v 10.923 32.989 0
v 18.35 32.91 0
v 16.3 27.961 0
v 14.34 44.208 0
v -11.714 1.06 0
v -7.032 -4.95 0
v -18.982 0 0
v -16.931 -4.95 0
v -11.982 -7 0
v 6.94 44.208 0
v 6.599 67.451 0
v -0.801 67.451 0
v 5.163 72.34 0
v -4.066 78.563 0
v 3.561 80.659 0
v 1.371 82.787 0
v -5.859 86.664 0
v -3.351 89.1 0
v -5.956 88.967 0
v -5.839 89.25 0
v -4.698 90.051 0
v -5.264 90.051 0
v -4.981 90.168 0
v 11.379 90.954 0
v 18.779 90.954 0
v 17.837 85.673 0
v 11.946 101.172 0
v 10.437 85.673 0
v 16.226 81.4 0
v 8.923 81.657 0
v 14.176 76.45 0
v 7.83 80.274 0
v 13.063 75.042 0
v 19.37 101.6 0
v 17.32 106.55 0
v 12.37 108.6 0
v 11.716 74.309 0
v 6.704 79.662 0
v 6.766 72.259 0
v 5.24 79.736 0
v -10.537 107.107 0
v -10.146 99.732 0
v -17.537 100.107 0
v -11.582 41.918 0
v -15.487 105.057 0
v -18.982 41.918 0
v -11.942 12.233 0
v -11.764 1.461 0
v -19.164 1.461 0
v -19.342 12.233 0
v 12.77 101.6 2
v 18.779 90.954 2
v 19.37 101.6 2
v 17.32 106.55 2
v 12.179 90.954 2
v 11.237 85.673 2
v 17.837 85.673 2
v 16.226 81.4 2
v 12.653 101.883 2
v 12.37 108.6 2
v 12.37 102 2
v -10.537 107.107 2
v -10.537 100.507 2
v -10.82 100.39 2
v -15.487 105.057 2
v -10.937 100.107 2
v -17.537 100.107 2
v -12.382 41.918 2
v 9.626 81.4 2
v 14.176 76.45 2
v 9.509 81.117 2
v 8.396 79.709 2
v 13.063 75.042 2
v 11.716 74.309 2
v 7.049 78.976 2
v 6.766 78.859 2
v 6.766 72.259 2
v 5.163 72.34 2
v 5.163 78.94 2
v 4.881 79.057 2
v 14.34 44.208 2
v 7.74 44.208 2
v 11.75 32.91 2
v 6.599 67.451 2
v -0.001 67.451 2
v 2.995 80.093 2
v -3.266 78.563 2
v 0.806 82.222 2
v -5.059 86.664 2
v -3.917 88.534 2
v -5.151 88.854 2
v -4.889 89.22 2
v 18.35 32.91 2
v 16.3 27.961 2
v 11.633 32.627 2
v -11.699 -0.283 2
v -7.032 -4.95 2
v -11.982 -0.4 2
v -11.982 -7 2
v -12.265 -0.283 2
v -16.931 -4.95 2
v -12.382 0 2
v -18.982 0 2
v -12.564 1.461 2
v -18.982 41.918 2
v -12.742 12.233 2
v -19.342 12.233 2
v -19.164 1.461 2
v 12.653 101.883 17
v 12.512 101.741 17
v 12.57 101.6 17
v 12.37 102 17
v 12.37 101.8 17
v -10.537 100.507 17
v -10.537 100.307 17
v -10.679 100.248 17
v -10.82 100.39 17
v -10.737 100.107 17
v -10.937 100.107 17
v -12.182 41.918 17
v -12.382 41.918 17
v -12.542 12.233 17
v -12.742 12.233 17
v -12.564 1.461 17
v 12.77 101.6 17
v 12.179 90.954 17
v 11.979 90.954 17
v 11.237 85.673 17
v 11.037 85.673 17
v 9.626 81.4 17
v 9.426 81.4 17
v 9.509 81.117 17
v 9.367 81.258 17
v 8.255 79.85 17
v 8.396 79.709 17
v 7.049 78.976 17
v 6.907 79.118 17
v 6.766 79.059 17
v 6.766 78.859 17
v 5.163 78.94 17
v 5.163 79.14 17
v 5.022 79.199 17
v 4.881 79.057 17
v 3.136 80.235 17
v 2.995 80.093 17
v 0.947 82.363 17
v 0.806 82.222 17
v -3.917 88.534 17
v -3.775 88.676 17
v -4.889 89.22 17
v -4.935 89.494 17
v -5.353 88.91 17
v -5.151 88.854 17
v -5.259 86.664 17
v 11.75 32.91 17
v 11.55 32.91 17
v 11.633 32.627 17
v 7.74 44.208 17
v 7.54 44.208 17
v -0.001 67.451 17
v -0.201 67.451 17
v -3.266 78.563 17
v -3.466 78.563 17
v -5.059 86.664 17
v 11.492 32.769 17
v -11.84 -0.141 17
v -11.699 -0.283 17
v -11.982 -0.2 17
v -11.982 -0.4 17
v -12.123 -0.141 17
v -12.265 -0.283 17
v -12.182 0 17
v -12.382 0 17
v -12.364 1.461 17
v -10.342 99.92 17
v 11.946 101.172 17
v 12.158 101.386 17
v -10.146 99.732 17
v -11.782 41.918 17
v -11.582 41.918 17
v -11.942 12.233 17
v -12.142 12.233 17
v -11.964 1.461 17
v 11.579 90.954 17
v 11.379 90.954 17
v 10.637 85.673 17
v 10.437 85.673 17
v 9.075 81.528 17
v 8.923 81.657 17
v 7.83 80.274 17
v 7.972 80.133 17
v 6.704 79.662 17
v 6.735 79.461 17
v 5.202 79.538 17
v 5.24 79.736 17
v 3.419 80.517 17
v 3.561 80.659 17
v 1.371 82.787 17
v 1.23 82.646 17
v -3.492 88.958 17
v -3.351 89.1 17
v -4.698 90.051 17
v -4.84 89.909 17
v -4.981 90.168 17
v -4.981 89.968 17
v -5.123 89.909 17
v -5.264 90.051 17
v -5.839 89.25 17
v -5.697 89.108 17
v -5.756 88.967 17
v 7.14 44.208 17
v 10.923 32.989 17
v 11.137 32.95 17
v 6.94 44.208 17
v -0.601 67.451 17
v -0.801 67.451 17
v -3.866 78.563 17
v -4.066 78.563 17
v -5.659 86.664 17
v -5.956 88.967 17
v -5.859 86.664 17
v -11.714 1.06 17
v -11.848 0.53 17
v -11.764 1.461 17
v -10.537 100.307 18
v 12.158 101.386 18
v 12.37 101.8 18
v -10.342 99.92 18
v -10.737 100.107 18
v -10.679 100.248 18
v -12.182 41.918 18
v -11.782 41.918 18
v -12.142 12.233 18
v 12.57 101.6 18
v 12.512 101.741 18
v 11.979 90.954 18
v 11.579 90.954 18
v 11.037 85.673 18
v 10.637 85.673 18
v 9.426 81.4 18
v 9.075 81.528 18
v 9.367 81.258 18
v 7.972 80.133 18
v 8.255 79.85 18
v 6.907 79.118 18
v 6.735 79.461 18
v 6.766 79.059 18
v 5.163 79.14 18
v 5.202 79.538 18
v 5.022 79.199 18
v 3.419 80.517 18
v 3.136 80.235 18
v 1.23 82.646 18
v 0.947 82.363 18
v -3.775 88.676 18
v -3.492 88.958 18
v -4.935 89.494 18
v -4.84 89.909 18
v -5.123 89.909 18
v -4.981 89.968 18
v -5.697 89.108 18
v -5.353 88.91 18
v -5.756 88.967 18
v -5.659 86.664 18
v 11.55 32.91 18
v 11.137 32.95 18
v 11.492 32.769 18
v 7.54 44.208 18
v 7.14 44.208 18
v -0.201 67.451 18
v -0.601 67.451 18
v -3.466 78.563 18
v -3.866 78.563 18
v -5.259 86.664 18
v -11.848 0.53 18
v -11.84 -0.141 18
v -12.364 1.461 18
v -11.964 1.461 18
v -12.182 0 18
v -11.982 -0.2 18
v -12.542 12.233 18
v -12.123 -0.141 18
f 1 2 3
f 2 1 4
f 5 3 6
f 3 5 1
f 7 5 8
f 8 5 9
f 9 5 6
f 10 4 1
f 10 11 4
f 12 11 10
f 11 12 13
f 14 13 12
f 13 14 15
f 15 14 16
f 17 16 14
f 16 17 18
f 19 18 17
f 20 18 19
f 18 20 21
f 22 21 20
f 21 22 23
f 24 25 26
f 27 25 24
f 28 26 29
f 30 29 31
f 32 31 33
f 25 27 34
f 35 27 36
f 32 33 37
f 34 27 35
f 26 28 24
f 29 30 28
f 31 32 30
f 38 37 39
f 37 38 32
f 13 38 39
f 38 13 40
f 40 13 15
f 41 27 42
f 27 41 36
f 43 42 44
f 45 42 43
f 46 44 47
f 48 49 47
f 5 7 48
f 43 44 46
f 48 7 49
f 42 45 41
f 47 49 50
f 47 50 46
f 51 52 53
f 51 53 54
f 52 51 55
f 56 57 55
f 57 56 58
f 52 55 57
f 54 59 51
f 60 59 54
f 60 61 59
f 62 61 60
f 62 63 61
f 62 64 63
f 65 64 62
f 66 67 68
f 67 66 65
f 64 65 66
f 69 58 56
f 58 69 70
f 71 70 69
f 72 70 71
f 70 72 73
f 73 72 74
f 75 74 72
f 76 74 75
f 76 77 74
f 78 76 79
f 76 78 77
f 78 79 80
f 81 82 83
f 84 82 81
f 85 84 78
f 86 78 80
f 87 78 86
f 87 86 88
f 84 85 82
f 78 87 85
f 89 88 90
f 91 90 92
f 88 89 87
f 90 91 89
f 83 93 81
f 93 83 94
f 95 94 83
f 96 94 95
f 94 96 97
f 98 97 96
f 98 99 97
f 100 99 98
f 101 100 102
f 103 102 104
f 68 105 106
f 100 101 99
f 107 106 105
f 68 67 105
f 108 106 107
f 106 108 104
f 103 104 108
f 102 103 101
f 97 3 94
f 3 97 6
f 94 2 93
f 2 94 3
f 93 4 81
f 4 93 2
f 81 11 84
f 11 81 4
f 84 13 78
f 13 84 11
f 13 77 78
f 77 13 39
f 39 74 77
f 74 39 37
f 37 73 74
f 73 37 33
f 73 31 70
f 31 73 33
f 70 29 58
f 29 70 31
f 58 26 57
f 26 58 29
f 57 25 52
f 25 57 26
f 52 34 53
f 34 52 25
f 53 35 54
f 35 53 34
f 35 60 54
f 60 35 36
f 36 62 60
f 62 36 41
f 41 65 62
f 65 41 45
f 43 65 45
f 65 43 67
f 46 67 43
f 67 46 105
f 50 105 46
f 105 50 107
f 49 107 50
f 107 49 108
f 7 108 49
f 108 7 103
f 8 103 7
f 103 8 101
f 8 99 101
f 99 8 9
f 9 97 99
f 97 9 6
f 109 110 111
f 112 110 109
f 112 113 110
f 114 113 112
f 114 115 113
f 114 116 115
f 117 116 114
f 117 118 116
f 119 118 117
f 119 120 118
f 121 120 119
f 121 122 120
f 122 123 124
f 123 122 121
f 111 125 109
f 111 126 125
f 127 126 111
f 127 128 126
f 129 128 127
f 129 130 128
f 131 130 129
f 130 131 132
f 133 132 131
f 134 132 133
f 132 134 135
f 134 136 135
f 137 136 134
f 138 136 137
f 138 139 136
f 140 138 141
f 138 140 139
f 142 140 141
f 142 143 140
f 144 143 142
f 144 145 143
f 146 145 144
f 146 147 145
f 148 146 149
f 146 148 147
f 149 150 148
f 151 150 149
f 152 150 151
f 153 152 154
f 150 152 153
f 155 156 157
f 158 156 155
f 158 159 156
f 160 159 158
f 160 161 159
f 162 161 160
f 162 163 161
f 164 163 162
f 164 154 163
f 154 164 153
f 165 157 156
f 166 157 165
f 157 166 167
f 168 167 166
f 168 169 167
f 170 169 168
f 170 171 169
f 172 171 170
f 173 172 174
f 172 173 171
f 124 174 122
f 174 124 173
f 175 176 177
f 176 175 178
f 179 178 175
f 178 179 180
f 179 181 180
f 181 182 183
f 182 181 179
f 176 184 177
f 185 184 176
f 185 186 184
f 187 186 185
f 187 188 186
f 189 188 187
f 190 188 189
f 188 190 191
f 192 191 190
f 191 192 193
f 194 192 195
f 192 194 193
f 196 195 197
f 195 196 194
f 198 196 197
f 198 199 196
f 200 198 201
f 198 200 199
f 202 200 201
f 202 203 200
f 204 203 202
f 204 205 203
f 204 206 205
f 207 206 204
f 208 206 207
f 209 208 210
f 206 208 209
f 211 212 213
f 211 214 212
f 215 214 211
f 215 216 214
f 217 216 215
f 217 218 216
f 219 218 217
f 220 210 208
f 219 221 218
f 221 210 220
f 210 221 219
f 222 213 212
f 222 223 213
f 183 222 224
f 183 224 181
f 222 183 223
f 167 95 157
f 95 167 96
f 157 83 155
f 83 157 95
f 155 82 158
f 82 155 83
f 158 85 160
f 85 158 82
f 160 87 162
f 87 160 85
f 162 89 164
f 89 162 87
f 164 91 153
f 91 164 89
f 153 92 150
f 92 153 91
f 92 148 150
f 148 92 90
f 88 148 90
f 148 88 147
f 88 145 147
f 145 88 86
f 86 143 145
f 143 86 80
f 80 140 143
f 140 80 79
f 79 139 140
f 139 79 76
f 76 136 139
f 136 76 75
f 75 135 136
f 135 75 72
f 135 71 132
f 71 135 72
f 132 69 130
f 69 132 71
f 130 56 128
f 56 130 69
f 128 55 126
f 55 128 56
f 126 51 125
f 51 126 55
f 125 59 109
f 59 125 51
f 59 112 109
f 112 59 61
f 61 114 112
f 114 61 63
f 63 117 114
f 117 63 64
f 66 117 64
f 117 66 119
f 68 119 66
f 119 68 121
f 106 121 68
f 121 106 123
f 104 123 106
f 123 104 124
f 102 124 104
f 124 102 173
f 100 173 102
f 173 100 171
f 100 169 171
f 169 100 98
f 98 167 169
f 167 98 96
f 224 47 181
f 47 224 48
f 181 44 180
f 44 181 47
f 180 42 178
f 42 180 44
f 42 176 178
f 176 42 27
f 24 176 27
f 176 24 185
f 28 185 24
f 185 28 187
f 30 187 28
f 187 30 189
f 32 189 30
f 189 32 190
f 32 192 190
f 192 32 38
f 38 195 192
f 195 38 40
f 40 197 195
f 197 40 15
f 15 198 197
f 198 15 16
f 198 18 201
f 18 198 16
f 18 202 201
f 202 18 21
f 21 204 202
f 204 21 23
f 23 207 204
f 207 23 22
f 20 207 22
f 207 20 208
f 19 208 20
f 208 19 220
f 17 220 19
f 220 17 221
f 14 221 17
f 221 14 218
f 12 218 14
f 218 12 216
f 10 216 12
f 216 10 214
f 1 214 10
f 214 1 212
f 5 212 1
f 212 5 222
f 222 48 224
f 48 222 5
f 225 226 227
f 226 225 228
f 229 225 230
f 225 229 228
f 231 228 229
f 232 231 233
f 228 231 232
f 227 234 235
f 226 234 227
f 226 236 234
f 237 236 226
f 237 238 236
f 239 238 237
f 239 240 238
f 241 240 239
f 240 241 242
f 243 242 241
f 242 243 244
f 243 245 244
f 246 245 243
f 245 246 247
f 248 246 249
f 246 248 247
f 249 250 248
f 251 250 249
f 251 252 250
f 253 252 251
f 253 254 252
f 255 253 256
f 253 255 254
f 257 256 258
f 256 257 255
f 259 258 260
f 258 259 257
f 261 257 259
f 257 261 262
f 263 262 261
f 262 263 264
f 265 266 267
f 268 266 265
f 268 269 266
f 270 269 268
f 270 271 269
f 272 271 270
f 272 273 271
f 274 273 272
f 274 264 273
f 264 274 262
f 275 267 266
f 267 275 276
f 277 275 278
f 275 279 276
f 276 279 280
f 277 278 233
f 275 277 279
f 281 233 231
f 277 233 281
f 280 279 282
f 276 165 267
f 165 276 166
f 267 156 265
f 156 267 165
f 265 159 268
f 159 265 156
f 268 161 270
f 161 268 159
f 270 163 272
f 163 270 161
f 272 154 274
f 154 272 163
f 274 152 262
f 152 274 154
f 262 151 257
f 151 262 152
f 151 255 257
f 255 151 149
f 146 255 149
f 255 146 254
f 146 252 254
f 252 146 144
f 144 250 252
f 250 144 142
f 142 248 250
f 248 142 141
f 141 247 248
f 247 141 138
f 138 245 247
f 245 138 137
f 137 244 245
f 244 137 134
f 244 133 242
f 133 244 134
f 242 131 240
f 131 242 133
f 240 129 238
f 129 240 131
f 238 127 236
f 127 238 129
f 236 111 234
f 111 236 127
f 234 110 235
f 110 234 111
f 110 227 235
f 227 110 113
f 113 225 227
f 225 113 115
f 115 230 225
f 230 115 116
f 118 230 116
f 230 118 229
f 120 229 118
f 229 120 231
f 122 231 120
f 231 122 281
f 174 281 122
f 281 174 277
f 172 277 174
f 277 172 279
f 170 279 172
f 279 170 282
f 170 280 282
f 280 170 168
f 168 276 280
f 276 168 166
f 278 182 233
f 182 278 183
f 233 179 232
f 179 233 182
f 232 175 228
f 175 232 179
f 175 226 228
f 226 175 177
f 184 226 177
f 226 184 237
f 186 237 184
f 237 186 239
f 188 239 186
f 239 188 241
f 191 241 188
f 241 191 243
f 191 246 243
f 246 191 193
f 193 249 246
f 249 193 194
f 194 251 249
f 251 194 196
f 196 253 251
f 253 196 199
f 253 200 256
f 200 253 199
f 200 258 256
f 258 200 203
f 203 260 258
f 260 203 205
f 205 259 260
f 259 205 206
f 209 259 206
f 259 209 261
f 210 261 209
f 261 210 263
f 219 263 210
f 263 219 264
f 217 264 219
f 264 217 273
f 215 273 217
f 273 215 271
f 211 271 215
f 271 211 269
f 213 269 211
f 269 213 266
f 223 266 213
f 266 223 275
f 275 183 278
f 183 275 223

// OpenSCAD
//!OpenSCAD
// This doesn't work because of the vector math for scaling the pts array at line 39
// removing the scale * from the start of that line, and from the translate at line 49 (to keep the object from translating off the screen) it works
edgeThickness = 0.4;
cutter_sizes = 4;
wallHeight = 17;
wallFlareWidth = 14;
wallFlareThickness = 2;
minWallWidth = .8;
maxWallWidth = .8;
insideWallFlareWidth = 1;
insideWallFlareThickness = 1.5;
minInsideWallWidth = 1;
maxInsideWallWidth = 3;
featureHeight = 14;
minFeatureThickness = 0.8;
maxFeatureThickness = 0.8;
connectorThickness = 2;
size = 25.4*cutter_sizes;

module dummy() {}

scale = size/25.108;

module ribbon(points, thickness=1, closed=false) {
    p = closed ? concat(points, [points[0]]) : points;
    
    union() {
        for (i=[1:len(p)-1]) {
            hull() {
                translate(p[i-1]) circle(d=thickness, $fn=8);
                translate(p[i]) circle(d=thickness, $fn=8);
            }
        }
    }
}

module cookieCutter() {

path0=scale*[[-2.604,305.284],[-2.961,290.904],[-3.050,283.568],[-3.006,280.906],[-2.961,280.545],[2.805,288.678],[1.814,291.470],[-0.099,297.214],[-0.906,299.960],[-1.349,301.962],[-1.373,302.531],[-1.231,302.729],[-0.898,302.494],[0.269,300.934],[0.810,300.408],[1.276,300.152],[1.672,300.132],[2.005,300.313],[2.280,300.661],[2.678,301.717],[2.911,303.022],[3.057,305.653],[-2.604,305.284]];
render(convexity=10) linear_extrude(height=(wallHeight)) ribbon(path0,thickness=min(maxWallWidth,max(0.001,minWallWidth)));
render(convexity=10) linear_extrude(height=(wallHeight+1)) ribbon(path0,thickness=edgeThickness);
difference() {
 render(convexity=10) linear_extrude(height=wallFlareThickness) ribbon(path0,thickness=wallFlareWidth);
 translate([0,0,-0.01]) linear_extrude(height=wallFlareThickness+0.02) polygon(points=path0);
}
}

translate([0,-280.545*scale,0]) cookieCutter();
